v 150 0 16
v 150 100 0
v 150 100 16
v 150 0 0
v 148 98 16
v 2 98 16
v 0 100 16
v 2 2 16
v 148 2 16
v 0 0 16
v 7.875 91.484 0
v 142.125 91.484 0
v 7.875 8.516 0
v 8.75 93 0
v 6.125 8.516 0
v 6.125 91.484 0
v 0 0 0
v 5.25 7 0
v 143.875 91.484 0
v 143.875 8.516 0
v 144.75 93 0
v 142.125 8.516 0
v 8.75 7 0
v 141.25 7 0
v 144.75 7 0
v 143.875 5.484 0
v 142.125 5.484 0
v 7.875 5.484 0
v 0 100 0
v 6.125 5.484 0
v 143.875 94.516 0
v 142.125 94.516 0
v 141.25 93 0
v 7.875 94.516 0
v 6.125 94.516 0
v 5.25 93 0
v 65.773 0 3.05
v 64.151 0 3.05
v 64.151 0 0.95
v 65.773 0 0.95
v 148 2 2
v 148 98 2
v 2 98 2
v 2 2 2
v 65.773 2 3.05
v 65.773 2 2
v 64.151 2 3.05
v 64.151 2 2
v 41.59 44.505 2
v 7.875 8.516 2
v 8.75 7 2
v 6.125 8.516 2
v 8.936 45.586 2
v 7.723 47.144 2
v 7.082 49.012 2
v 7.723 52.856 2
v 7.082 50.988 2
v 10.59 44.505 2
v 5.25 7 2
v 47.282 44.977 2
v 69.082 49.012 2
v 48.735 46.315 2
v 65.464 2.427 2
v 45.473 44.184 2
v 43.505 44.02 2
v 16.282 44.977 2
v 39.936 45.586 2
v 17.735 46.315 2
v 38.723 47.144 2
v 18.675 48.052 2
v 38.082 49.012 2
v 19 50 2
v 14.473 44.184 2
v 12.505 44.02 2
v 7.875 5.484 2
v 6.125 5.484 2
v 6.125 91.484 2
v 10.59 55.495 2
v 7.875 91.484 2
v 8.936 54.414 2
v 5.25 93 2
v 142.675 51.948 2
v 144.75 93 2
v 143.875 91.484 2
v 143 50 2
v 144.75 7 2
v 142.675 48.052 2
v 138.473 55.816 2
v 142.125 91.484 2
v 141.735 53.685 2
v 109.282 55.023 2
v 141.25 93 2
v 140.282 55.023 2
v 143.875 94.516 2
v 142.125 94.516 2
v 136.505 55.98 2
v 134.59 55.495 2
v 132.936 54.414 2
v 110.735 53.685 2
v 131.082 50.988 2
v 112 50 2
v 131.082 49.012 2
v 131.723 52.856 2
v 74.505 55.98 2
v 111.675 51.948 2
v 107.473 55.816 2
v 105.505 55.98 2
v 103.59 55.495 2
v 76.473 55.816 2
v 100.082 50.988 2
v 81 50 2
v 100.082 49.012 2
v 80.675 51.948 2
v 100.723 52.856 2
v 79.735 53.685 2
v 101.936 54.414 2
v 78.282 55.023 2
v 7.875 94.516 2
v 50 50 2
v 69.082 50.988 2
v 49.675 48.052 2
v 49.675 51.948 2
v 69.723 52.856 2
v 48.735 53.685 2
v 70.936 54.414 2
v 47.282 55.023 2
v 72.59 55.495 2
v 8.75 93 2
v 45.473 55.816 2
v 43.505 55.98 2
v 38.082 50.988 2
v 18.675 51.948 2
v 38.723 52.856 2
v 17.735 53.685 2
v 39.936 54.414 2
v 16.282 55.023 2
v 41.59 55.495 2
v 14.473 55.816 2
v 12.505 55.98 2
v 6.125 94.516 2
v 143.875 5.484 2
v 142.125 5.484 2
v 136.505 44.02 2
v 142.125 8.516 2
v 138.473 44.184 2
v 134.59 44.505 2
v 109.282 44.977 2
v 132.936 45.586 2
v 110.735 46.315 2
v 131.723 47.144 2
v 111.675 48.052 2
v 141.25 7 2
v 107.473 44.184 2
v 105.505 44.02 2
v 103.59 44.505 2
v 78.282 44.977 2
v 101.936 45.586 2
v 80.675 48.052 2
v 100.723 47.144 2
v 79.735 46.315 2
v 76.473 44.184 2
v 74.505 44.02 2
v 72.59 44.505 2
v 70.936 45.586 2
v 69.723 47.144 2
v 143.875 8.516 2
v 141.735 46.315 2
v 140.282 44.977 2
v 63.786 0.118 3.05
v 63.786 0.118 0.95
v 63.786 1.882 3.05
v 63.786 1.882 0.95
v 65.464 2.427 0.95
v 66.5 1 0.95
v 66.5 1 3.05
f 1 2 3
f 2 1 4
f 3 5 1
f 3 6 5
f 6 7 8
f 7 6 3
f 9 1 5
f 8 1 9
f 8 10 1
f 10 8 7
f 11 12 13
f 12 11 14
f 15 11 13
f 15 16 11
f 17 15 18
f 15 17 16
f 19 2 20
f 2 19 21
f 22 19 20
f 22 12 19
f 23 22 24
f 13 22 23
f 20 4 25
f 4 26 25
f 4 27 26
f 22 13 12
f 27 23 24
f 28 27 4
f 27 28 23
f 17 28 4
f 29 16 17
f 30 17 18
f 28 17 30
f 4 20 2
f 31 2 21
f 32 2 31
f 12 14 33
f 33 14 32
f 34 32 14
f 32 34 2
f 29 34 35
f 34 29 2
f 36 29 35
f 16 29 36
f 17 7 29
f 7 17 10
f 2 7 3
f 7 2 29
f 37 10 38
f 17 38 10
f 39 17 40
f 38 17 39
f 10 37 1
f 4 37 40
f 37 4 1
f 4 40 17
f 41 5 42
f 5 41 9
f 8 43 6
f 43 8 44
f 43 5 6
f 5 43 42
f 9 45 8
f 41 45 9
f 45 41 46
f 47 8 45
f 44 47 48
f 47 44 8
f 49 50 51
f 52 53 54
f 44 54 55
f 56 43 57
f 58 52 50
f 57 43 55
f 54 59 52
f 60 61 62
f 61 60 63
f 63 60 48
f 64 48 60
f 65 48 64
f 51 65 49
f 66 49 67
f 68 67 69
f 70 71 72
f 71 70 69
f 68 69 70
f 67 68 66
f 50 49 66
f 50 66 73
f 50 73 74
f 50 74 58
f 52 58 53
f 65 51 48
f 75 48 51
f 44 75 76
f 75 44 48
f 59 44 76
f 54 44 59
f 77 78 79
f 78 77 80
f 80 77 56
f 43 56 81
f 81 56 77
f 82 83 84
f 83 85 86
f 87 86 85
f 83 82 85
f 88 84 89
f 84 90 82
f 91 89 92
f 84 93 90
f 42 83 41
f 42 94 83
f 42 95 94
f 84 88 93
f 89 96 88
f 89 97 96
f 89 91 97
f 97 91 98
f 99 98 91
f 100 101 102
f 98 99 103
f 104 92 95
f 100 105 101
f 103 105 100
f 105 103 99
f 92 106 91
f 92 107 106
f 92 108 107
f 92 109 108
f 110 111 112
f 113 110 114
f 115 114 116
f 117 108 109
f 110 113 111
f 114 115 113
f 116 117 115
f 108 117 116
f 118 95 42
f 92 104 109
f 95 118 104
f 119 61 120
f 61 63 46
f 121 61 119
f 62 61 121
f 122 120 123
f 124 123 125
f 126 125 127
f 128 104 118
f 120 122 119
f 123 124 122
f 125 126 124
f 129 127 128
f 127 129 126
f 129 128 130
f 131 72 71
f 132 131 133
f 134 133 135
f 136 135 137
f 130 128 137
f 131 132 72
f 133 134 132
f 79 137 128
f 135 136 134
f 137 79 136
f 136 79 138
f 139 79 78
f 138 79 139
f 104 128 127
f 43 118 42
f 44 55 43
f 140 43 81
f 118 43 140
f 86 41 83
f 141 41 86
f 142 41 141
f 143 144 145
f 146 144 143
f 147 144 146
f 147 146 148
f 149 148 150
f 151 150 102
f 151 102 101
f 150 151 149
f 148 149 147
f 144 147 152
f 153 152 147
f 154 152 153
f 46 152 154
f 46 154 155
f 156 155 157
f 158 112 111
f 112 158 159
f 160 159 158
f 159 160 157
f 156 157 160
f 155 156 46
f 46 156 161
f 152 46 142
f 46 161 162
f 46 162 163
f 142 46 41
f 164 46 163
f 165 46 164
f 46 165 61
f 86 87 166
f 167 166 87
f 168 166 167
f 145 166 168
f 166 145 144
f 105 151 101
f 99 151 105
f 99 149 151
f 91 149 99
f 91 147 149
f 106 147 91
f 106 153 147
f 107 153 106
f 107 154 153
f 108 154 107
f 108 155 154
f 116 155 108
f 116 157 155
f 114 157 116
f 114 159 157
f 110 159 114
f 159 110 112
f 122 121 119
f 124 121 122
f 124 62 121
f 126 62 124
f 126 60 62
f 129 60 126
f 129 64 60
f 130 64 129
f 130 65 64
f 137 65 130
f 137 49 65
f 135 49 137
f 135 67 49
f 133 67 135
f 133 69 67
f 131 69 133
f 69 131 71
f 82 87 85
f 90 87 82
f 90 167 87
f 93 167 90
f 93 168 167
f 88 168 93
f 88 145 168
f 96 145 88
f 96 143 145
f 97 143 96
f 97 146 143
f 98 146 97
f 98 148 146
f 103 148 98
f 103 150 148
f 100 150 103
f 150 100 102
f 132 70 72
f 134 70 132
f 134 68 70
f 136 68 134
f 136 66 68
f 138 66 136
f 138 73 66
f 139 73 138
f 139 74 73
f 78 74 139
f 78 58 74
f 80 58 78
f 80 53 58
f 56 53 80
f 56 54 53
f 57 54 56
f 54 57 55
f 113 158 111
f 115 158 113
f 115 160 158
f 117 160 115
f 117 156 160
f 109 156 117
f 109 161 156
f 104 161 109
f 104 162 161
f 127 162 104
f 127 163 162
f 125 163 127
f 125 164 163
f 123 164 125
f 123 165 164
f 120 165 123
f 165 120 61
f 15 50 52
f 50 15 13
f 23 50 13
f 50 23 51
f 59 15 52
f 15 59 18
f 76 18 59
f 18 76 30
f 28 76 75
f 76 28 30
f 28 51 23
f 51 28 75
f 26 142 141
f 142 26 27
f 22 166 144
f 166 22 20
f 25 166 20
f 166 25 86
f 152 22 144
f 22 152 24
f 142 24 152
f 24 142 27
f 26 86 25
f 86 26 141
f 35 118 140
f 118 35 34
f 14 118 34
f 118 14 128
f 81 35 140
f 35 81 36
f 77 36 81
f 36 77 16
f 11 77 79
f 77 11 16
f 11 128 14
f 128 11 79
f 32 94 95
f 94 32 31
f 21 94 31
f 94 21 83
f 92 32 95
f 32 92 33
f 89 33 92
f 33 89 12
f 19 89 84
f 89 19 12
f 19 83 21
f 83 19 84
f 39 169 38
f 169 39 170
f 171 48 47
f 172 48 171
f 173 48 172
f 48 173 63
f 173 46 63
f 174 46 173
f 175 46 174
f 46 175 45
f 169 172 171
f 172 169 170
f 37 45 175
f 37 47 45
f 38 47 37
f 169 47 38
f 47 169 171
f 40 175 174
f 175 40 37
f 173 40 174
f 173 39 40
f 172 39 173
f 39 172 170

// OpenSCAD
difference() {
	union() {
		cube(size = [150, 100, 2]);
		difference() {
			cube(size = [150, 100, 16.0000000000]);
			translate(v = [2, 2, 0]) {
				cube(size = [146, 96, 16.0000000000]);
			}
		}
	}
	union() {
		translate(v = [-18.0000000000, 50.0000000000, 2]) {
			cylinder(d = 12, h = 22.1000000000);
		}
		translate(v = [13.0000000000, 50.0000000000, 2]) {
			cylinder(d = 12, h = 22.1000000000);
		}
		translate(v = [44.0000000000, 50.0000000000, 2]) {
			cylinder(d = 12, h = 22.1000000000);
		}
		translate(v = [75.0000000000, 50.0000000000, 2]) {
			cylinder(d = 12, h = 22.1000000000);
		}
		translate(v = [106.0000000000, 50.0000000000, 2]) {
			cylinder(d = 12, h = 22.1000000000);
		}
		translate(v = [137.0000000000, 50.0000000000, 2]) {
			cylinder(d = 12, h = 22.1000000000);
		}
		translate(v = [168.0000000000, 50.0000000000, 2]) {
			cylinder(d = 12, h = 22.1000000000);
		}
	}
	translate(v = [65.0000000000, 1.0000000000, 2]) {
		cylinder(center = true, d = 3, h = 2.1000000000);
	}
	union() {
		translate(v = [7, 7, 0]) {
			cylinder(d = 3.5000000000, h = 2.1000000000);
		}
		translate(v = [143, 7, 0]) {
			cylinder(d = 3.5000000000, h = 2.1000000000);
		}
		translate(v = [7, 93, 0]) {
			cylinder(d = 3.5000000000, h = 2.1000000000);
		}
		translate(v = [143, 93, 0]) {
			cylinder(d = 3.5000000000, h = 2.1000000000);
		}
	}
}
